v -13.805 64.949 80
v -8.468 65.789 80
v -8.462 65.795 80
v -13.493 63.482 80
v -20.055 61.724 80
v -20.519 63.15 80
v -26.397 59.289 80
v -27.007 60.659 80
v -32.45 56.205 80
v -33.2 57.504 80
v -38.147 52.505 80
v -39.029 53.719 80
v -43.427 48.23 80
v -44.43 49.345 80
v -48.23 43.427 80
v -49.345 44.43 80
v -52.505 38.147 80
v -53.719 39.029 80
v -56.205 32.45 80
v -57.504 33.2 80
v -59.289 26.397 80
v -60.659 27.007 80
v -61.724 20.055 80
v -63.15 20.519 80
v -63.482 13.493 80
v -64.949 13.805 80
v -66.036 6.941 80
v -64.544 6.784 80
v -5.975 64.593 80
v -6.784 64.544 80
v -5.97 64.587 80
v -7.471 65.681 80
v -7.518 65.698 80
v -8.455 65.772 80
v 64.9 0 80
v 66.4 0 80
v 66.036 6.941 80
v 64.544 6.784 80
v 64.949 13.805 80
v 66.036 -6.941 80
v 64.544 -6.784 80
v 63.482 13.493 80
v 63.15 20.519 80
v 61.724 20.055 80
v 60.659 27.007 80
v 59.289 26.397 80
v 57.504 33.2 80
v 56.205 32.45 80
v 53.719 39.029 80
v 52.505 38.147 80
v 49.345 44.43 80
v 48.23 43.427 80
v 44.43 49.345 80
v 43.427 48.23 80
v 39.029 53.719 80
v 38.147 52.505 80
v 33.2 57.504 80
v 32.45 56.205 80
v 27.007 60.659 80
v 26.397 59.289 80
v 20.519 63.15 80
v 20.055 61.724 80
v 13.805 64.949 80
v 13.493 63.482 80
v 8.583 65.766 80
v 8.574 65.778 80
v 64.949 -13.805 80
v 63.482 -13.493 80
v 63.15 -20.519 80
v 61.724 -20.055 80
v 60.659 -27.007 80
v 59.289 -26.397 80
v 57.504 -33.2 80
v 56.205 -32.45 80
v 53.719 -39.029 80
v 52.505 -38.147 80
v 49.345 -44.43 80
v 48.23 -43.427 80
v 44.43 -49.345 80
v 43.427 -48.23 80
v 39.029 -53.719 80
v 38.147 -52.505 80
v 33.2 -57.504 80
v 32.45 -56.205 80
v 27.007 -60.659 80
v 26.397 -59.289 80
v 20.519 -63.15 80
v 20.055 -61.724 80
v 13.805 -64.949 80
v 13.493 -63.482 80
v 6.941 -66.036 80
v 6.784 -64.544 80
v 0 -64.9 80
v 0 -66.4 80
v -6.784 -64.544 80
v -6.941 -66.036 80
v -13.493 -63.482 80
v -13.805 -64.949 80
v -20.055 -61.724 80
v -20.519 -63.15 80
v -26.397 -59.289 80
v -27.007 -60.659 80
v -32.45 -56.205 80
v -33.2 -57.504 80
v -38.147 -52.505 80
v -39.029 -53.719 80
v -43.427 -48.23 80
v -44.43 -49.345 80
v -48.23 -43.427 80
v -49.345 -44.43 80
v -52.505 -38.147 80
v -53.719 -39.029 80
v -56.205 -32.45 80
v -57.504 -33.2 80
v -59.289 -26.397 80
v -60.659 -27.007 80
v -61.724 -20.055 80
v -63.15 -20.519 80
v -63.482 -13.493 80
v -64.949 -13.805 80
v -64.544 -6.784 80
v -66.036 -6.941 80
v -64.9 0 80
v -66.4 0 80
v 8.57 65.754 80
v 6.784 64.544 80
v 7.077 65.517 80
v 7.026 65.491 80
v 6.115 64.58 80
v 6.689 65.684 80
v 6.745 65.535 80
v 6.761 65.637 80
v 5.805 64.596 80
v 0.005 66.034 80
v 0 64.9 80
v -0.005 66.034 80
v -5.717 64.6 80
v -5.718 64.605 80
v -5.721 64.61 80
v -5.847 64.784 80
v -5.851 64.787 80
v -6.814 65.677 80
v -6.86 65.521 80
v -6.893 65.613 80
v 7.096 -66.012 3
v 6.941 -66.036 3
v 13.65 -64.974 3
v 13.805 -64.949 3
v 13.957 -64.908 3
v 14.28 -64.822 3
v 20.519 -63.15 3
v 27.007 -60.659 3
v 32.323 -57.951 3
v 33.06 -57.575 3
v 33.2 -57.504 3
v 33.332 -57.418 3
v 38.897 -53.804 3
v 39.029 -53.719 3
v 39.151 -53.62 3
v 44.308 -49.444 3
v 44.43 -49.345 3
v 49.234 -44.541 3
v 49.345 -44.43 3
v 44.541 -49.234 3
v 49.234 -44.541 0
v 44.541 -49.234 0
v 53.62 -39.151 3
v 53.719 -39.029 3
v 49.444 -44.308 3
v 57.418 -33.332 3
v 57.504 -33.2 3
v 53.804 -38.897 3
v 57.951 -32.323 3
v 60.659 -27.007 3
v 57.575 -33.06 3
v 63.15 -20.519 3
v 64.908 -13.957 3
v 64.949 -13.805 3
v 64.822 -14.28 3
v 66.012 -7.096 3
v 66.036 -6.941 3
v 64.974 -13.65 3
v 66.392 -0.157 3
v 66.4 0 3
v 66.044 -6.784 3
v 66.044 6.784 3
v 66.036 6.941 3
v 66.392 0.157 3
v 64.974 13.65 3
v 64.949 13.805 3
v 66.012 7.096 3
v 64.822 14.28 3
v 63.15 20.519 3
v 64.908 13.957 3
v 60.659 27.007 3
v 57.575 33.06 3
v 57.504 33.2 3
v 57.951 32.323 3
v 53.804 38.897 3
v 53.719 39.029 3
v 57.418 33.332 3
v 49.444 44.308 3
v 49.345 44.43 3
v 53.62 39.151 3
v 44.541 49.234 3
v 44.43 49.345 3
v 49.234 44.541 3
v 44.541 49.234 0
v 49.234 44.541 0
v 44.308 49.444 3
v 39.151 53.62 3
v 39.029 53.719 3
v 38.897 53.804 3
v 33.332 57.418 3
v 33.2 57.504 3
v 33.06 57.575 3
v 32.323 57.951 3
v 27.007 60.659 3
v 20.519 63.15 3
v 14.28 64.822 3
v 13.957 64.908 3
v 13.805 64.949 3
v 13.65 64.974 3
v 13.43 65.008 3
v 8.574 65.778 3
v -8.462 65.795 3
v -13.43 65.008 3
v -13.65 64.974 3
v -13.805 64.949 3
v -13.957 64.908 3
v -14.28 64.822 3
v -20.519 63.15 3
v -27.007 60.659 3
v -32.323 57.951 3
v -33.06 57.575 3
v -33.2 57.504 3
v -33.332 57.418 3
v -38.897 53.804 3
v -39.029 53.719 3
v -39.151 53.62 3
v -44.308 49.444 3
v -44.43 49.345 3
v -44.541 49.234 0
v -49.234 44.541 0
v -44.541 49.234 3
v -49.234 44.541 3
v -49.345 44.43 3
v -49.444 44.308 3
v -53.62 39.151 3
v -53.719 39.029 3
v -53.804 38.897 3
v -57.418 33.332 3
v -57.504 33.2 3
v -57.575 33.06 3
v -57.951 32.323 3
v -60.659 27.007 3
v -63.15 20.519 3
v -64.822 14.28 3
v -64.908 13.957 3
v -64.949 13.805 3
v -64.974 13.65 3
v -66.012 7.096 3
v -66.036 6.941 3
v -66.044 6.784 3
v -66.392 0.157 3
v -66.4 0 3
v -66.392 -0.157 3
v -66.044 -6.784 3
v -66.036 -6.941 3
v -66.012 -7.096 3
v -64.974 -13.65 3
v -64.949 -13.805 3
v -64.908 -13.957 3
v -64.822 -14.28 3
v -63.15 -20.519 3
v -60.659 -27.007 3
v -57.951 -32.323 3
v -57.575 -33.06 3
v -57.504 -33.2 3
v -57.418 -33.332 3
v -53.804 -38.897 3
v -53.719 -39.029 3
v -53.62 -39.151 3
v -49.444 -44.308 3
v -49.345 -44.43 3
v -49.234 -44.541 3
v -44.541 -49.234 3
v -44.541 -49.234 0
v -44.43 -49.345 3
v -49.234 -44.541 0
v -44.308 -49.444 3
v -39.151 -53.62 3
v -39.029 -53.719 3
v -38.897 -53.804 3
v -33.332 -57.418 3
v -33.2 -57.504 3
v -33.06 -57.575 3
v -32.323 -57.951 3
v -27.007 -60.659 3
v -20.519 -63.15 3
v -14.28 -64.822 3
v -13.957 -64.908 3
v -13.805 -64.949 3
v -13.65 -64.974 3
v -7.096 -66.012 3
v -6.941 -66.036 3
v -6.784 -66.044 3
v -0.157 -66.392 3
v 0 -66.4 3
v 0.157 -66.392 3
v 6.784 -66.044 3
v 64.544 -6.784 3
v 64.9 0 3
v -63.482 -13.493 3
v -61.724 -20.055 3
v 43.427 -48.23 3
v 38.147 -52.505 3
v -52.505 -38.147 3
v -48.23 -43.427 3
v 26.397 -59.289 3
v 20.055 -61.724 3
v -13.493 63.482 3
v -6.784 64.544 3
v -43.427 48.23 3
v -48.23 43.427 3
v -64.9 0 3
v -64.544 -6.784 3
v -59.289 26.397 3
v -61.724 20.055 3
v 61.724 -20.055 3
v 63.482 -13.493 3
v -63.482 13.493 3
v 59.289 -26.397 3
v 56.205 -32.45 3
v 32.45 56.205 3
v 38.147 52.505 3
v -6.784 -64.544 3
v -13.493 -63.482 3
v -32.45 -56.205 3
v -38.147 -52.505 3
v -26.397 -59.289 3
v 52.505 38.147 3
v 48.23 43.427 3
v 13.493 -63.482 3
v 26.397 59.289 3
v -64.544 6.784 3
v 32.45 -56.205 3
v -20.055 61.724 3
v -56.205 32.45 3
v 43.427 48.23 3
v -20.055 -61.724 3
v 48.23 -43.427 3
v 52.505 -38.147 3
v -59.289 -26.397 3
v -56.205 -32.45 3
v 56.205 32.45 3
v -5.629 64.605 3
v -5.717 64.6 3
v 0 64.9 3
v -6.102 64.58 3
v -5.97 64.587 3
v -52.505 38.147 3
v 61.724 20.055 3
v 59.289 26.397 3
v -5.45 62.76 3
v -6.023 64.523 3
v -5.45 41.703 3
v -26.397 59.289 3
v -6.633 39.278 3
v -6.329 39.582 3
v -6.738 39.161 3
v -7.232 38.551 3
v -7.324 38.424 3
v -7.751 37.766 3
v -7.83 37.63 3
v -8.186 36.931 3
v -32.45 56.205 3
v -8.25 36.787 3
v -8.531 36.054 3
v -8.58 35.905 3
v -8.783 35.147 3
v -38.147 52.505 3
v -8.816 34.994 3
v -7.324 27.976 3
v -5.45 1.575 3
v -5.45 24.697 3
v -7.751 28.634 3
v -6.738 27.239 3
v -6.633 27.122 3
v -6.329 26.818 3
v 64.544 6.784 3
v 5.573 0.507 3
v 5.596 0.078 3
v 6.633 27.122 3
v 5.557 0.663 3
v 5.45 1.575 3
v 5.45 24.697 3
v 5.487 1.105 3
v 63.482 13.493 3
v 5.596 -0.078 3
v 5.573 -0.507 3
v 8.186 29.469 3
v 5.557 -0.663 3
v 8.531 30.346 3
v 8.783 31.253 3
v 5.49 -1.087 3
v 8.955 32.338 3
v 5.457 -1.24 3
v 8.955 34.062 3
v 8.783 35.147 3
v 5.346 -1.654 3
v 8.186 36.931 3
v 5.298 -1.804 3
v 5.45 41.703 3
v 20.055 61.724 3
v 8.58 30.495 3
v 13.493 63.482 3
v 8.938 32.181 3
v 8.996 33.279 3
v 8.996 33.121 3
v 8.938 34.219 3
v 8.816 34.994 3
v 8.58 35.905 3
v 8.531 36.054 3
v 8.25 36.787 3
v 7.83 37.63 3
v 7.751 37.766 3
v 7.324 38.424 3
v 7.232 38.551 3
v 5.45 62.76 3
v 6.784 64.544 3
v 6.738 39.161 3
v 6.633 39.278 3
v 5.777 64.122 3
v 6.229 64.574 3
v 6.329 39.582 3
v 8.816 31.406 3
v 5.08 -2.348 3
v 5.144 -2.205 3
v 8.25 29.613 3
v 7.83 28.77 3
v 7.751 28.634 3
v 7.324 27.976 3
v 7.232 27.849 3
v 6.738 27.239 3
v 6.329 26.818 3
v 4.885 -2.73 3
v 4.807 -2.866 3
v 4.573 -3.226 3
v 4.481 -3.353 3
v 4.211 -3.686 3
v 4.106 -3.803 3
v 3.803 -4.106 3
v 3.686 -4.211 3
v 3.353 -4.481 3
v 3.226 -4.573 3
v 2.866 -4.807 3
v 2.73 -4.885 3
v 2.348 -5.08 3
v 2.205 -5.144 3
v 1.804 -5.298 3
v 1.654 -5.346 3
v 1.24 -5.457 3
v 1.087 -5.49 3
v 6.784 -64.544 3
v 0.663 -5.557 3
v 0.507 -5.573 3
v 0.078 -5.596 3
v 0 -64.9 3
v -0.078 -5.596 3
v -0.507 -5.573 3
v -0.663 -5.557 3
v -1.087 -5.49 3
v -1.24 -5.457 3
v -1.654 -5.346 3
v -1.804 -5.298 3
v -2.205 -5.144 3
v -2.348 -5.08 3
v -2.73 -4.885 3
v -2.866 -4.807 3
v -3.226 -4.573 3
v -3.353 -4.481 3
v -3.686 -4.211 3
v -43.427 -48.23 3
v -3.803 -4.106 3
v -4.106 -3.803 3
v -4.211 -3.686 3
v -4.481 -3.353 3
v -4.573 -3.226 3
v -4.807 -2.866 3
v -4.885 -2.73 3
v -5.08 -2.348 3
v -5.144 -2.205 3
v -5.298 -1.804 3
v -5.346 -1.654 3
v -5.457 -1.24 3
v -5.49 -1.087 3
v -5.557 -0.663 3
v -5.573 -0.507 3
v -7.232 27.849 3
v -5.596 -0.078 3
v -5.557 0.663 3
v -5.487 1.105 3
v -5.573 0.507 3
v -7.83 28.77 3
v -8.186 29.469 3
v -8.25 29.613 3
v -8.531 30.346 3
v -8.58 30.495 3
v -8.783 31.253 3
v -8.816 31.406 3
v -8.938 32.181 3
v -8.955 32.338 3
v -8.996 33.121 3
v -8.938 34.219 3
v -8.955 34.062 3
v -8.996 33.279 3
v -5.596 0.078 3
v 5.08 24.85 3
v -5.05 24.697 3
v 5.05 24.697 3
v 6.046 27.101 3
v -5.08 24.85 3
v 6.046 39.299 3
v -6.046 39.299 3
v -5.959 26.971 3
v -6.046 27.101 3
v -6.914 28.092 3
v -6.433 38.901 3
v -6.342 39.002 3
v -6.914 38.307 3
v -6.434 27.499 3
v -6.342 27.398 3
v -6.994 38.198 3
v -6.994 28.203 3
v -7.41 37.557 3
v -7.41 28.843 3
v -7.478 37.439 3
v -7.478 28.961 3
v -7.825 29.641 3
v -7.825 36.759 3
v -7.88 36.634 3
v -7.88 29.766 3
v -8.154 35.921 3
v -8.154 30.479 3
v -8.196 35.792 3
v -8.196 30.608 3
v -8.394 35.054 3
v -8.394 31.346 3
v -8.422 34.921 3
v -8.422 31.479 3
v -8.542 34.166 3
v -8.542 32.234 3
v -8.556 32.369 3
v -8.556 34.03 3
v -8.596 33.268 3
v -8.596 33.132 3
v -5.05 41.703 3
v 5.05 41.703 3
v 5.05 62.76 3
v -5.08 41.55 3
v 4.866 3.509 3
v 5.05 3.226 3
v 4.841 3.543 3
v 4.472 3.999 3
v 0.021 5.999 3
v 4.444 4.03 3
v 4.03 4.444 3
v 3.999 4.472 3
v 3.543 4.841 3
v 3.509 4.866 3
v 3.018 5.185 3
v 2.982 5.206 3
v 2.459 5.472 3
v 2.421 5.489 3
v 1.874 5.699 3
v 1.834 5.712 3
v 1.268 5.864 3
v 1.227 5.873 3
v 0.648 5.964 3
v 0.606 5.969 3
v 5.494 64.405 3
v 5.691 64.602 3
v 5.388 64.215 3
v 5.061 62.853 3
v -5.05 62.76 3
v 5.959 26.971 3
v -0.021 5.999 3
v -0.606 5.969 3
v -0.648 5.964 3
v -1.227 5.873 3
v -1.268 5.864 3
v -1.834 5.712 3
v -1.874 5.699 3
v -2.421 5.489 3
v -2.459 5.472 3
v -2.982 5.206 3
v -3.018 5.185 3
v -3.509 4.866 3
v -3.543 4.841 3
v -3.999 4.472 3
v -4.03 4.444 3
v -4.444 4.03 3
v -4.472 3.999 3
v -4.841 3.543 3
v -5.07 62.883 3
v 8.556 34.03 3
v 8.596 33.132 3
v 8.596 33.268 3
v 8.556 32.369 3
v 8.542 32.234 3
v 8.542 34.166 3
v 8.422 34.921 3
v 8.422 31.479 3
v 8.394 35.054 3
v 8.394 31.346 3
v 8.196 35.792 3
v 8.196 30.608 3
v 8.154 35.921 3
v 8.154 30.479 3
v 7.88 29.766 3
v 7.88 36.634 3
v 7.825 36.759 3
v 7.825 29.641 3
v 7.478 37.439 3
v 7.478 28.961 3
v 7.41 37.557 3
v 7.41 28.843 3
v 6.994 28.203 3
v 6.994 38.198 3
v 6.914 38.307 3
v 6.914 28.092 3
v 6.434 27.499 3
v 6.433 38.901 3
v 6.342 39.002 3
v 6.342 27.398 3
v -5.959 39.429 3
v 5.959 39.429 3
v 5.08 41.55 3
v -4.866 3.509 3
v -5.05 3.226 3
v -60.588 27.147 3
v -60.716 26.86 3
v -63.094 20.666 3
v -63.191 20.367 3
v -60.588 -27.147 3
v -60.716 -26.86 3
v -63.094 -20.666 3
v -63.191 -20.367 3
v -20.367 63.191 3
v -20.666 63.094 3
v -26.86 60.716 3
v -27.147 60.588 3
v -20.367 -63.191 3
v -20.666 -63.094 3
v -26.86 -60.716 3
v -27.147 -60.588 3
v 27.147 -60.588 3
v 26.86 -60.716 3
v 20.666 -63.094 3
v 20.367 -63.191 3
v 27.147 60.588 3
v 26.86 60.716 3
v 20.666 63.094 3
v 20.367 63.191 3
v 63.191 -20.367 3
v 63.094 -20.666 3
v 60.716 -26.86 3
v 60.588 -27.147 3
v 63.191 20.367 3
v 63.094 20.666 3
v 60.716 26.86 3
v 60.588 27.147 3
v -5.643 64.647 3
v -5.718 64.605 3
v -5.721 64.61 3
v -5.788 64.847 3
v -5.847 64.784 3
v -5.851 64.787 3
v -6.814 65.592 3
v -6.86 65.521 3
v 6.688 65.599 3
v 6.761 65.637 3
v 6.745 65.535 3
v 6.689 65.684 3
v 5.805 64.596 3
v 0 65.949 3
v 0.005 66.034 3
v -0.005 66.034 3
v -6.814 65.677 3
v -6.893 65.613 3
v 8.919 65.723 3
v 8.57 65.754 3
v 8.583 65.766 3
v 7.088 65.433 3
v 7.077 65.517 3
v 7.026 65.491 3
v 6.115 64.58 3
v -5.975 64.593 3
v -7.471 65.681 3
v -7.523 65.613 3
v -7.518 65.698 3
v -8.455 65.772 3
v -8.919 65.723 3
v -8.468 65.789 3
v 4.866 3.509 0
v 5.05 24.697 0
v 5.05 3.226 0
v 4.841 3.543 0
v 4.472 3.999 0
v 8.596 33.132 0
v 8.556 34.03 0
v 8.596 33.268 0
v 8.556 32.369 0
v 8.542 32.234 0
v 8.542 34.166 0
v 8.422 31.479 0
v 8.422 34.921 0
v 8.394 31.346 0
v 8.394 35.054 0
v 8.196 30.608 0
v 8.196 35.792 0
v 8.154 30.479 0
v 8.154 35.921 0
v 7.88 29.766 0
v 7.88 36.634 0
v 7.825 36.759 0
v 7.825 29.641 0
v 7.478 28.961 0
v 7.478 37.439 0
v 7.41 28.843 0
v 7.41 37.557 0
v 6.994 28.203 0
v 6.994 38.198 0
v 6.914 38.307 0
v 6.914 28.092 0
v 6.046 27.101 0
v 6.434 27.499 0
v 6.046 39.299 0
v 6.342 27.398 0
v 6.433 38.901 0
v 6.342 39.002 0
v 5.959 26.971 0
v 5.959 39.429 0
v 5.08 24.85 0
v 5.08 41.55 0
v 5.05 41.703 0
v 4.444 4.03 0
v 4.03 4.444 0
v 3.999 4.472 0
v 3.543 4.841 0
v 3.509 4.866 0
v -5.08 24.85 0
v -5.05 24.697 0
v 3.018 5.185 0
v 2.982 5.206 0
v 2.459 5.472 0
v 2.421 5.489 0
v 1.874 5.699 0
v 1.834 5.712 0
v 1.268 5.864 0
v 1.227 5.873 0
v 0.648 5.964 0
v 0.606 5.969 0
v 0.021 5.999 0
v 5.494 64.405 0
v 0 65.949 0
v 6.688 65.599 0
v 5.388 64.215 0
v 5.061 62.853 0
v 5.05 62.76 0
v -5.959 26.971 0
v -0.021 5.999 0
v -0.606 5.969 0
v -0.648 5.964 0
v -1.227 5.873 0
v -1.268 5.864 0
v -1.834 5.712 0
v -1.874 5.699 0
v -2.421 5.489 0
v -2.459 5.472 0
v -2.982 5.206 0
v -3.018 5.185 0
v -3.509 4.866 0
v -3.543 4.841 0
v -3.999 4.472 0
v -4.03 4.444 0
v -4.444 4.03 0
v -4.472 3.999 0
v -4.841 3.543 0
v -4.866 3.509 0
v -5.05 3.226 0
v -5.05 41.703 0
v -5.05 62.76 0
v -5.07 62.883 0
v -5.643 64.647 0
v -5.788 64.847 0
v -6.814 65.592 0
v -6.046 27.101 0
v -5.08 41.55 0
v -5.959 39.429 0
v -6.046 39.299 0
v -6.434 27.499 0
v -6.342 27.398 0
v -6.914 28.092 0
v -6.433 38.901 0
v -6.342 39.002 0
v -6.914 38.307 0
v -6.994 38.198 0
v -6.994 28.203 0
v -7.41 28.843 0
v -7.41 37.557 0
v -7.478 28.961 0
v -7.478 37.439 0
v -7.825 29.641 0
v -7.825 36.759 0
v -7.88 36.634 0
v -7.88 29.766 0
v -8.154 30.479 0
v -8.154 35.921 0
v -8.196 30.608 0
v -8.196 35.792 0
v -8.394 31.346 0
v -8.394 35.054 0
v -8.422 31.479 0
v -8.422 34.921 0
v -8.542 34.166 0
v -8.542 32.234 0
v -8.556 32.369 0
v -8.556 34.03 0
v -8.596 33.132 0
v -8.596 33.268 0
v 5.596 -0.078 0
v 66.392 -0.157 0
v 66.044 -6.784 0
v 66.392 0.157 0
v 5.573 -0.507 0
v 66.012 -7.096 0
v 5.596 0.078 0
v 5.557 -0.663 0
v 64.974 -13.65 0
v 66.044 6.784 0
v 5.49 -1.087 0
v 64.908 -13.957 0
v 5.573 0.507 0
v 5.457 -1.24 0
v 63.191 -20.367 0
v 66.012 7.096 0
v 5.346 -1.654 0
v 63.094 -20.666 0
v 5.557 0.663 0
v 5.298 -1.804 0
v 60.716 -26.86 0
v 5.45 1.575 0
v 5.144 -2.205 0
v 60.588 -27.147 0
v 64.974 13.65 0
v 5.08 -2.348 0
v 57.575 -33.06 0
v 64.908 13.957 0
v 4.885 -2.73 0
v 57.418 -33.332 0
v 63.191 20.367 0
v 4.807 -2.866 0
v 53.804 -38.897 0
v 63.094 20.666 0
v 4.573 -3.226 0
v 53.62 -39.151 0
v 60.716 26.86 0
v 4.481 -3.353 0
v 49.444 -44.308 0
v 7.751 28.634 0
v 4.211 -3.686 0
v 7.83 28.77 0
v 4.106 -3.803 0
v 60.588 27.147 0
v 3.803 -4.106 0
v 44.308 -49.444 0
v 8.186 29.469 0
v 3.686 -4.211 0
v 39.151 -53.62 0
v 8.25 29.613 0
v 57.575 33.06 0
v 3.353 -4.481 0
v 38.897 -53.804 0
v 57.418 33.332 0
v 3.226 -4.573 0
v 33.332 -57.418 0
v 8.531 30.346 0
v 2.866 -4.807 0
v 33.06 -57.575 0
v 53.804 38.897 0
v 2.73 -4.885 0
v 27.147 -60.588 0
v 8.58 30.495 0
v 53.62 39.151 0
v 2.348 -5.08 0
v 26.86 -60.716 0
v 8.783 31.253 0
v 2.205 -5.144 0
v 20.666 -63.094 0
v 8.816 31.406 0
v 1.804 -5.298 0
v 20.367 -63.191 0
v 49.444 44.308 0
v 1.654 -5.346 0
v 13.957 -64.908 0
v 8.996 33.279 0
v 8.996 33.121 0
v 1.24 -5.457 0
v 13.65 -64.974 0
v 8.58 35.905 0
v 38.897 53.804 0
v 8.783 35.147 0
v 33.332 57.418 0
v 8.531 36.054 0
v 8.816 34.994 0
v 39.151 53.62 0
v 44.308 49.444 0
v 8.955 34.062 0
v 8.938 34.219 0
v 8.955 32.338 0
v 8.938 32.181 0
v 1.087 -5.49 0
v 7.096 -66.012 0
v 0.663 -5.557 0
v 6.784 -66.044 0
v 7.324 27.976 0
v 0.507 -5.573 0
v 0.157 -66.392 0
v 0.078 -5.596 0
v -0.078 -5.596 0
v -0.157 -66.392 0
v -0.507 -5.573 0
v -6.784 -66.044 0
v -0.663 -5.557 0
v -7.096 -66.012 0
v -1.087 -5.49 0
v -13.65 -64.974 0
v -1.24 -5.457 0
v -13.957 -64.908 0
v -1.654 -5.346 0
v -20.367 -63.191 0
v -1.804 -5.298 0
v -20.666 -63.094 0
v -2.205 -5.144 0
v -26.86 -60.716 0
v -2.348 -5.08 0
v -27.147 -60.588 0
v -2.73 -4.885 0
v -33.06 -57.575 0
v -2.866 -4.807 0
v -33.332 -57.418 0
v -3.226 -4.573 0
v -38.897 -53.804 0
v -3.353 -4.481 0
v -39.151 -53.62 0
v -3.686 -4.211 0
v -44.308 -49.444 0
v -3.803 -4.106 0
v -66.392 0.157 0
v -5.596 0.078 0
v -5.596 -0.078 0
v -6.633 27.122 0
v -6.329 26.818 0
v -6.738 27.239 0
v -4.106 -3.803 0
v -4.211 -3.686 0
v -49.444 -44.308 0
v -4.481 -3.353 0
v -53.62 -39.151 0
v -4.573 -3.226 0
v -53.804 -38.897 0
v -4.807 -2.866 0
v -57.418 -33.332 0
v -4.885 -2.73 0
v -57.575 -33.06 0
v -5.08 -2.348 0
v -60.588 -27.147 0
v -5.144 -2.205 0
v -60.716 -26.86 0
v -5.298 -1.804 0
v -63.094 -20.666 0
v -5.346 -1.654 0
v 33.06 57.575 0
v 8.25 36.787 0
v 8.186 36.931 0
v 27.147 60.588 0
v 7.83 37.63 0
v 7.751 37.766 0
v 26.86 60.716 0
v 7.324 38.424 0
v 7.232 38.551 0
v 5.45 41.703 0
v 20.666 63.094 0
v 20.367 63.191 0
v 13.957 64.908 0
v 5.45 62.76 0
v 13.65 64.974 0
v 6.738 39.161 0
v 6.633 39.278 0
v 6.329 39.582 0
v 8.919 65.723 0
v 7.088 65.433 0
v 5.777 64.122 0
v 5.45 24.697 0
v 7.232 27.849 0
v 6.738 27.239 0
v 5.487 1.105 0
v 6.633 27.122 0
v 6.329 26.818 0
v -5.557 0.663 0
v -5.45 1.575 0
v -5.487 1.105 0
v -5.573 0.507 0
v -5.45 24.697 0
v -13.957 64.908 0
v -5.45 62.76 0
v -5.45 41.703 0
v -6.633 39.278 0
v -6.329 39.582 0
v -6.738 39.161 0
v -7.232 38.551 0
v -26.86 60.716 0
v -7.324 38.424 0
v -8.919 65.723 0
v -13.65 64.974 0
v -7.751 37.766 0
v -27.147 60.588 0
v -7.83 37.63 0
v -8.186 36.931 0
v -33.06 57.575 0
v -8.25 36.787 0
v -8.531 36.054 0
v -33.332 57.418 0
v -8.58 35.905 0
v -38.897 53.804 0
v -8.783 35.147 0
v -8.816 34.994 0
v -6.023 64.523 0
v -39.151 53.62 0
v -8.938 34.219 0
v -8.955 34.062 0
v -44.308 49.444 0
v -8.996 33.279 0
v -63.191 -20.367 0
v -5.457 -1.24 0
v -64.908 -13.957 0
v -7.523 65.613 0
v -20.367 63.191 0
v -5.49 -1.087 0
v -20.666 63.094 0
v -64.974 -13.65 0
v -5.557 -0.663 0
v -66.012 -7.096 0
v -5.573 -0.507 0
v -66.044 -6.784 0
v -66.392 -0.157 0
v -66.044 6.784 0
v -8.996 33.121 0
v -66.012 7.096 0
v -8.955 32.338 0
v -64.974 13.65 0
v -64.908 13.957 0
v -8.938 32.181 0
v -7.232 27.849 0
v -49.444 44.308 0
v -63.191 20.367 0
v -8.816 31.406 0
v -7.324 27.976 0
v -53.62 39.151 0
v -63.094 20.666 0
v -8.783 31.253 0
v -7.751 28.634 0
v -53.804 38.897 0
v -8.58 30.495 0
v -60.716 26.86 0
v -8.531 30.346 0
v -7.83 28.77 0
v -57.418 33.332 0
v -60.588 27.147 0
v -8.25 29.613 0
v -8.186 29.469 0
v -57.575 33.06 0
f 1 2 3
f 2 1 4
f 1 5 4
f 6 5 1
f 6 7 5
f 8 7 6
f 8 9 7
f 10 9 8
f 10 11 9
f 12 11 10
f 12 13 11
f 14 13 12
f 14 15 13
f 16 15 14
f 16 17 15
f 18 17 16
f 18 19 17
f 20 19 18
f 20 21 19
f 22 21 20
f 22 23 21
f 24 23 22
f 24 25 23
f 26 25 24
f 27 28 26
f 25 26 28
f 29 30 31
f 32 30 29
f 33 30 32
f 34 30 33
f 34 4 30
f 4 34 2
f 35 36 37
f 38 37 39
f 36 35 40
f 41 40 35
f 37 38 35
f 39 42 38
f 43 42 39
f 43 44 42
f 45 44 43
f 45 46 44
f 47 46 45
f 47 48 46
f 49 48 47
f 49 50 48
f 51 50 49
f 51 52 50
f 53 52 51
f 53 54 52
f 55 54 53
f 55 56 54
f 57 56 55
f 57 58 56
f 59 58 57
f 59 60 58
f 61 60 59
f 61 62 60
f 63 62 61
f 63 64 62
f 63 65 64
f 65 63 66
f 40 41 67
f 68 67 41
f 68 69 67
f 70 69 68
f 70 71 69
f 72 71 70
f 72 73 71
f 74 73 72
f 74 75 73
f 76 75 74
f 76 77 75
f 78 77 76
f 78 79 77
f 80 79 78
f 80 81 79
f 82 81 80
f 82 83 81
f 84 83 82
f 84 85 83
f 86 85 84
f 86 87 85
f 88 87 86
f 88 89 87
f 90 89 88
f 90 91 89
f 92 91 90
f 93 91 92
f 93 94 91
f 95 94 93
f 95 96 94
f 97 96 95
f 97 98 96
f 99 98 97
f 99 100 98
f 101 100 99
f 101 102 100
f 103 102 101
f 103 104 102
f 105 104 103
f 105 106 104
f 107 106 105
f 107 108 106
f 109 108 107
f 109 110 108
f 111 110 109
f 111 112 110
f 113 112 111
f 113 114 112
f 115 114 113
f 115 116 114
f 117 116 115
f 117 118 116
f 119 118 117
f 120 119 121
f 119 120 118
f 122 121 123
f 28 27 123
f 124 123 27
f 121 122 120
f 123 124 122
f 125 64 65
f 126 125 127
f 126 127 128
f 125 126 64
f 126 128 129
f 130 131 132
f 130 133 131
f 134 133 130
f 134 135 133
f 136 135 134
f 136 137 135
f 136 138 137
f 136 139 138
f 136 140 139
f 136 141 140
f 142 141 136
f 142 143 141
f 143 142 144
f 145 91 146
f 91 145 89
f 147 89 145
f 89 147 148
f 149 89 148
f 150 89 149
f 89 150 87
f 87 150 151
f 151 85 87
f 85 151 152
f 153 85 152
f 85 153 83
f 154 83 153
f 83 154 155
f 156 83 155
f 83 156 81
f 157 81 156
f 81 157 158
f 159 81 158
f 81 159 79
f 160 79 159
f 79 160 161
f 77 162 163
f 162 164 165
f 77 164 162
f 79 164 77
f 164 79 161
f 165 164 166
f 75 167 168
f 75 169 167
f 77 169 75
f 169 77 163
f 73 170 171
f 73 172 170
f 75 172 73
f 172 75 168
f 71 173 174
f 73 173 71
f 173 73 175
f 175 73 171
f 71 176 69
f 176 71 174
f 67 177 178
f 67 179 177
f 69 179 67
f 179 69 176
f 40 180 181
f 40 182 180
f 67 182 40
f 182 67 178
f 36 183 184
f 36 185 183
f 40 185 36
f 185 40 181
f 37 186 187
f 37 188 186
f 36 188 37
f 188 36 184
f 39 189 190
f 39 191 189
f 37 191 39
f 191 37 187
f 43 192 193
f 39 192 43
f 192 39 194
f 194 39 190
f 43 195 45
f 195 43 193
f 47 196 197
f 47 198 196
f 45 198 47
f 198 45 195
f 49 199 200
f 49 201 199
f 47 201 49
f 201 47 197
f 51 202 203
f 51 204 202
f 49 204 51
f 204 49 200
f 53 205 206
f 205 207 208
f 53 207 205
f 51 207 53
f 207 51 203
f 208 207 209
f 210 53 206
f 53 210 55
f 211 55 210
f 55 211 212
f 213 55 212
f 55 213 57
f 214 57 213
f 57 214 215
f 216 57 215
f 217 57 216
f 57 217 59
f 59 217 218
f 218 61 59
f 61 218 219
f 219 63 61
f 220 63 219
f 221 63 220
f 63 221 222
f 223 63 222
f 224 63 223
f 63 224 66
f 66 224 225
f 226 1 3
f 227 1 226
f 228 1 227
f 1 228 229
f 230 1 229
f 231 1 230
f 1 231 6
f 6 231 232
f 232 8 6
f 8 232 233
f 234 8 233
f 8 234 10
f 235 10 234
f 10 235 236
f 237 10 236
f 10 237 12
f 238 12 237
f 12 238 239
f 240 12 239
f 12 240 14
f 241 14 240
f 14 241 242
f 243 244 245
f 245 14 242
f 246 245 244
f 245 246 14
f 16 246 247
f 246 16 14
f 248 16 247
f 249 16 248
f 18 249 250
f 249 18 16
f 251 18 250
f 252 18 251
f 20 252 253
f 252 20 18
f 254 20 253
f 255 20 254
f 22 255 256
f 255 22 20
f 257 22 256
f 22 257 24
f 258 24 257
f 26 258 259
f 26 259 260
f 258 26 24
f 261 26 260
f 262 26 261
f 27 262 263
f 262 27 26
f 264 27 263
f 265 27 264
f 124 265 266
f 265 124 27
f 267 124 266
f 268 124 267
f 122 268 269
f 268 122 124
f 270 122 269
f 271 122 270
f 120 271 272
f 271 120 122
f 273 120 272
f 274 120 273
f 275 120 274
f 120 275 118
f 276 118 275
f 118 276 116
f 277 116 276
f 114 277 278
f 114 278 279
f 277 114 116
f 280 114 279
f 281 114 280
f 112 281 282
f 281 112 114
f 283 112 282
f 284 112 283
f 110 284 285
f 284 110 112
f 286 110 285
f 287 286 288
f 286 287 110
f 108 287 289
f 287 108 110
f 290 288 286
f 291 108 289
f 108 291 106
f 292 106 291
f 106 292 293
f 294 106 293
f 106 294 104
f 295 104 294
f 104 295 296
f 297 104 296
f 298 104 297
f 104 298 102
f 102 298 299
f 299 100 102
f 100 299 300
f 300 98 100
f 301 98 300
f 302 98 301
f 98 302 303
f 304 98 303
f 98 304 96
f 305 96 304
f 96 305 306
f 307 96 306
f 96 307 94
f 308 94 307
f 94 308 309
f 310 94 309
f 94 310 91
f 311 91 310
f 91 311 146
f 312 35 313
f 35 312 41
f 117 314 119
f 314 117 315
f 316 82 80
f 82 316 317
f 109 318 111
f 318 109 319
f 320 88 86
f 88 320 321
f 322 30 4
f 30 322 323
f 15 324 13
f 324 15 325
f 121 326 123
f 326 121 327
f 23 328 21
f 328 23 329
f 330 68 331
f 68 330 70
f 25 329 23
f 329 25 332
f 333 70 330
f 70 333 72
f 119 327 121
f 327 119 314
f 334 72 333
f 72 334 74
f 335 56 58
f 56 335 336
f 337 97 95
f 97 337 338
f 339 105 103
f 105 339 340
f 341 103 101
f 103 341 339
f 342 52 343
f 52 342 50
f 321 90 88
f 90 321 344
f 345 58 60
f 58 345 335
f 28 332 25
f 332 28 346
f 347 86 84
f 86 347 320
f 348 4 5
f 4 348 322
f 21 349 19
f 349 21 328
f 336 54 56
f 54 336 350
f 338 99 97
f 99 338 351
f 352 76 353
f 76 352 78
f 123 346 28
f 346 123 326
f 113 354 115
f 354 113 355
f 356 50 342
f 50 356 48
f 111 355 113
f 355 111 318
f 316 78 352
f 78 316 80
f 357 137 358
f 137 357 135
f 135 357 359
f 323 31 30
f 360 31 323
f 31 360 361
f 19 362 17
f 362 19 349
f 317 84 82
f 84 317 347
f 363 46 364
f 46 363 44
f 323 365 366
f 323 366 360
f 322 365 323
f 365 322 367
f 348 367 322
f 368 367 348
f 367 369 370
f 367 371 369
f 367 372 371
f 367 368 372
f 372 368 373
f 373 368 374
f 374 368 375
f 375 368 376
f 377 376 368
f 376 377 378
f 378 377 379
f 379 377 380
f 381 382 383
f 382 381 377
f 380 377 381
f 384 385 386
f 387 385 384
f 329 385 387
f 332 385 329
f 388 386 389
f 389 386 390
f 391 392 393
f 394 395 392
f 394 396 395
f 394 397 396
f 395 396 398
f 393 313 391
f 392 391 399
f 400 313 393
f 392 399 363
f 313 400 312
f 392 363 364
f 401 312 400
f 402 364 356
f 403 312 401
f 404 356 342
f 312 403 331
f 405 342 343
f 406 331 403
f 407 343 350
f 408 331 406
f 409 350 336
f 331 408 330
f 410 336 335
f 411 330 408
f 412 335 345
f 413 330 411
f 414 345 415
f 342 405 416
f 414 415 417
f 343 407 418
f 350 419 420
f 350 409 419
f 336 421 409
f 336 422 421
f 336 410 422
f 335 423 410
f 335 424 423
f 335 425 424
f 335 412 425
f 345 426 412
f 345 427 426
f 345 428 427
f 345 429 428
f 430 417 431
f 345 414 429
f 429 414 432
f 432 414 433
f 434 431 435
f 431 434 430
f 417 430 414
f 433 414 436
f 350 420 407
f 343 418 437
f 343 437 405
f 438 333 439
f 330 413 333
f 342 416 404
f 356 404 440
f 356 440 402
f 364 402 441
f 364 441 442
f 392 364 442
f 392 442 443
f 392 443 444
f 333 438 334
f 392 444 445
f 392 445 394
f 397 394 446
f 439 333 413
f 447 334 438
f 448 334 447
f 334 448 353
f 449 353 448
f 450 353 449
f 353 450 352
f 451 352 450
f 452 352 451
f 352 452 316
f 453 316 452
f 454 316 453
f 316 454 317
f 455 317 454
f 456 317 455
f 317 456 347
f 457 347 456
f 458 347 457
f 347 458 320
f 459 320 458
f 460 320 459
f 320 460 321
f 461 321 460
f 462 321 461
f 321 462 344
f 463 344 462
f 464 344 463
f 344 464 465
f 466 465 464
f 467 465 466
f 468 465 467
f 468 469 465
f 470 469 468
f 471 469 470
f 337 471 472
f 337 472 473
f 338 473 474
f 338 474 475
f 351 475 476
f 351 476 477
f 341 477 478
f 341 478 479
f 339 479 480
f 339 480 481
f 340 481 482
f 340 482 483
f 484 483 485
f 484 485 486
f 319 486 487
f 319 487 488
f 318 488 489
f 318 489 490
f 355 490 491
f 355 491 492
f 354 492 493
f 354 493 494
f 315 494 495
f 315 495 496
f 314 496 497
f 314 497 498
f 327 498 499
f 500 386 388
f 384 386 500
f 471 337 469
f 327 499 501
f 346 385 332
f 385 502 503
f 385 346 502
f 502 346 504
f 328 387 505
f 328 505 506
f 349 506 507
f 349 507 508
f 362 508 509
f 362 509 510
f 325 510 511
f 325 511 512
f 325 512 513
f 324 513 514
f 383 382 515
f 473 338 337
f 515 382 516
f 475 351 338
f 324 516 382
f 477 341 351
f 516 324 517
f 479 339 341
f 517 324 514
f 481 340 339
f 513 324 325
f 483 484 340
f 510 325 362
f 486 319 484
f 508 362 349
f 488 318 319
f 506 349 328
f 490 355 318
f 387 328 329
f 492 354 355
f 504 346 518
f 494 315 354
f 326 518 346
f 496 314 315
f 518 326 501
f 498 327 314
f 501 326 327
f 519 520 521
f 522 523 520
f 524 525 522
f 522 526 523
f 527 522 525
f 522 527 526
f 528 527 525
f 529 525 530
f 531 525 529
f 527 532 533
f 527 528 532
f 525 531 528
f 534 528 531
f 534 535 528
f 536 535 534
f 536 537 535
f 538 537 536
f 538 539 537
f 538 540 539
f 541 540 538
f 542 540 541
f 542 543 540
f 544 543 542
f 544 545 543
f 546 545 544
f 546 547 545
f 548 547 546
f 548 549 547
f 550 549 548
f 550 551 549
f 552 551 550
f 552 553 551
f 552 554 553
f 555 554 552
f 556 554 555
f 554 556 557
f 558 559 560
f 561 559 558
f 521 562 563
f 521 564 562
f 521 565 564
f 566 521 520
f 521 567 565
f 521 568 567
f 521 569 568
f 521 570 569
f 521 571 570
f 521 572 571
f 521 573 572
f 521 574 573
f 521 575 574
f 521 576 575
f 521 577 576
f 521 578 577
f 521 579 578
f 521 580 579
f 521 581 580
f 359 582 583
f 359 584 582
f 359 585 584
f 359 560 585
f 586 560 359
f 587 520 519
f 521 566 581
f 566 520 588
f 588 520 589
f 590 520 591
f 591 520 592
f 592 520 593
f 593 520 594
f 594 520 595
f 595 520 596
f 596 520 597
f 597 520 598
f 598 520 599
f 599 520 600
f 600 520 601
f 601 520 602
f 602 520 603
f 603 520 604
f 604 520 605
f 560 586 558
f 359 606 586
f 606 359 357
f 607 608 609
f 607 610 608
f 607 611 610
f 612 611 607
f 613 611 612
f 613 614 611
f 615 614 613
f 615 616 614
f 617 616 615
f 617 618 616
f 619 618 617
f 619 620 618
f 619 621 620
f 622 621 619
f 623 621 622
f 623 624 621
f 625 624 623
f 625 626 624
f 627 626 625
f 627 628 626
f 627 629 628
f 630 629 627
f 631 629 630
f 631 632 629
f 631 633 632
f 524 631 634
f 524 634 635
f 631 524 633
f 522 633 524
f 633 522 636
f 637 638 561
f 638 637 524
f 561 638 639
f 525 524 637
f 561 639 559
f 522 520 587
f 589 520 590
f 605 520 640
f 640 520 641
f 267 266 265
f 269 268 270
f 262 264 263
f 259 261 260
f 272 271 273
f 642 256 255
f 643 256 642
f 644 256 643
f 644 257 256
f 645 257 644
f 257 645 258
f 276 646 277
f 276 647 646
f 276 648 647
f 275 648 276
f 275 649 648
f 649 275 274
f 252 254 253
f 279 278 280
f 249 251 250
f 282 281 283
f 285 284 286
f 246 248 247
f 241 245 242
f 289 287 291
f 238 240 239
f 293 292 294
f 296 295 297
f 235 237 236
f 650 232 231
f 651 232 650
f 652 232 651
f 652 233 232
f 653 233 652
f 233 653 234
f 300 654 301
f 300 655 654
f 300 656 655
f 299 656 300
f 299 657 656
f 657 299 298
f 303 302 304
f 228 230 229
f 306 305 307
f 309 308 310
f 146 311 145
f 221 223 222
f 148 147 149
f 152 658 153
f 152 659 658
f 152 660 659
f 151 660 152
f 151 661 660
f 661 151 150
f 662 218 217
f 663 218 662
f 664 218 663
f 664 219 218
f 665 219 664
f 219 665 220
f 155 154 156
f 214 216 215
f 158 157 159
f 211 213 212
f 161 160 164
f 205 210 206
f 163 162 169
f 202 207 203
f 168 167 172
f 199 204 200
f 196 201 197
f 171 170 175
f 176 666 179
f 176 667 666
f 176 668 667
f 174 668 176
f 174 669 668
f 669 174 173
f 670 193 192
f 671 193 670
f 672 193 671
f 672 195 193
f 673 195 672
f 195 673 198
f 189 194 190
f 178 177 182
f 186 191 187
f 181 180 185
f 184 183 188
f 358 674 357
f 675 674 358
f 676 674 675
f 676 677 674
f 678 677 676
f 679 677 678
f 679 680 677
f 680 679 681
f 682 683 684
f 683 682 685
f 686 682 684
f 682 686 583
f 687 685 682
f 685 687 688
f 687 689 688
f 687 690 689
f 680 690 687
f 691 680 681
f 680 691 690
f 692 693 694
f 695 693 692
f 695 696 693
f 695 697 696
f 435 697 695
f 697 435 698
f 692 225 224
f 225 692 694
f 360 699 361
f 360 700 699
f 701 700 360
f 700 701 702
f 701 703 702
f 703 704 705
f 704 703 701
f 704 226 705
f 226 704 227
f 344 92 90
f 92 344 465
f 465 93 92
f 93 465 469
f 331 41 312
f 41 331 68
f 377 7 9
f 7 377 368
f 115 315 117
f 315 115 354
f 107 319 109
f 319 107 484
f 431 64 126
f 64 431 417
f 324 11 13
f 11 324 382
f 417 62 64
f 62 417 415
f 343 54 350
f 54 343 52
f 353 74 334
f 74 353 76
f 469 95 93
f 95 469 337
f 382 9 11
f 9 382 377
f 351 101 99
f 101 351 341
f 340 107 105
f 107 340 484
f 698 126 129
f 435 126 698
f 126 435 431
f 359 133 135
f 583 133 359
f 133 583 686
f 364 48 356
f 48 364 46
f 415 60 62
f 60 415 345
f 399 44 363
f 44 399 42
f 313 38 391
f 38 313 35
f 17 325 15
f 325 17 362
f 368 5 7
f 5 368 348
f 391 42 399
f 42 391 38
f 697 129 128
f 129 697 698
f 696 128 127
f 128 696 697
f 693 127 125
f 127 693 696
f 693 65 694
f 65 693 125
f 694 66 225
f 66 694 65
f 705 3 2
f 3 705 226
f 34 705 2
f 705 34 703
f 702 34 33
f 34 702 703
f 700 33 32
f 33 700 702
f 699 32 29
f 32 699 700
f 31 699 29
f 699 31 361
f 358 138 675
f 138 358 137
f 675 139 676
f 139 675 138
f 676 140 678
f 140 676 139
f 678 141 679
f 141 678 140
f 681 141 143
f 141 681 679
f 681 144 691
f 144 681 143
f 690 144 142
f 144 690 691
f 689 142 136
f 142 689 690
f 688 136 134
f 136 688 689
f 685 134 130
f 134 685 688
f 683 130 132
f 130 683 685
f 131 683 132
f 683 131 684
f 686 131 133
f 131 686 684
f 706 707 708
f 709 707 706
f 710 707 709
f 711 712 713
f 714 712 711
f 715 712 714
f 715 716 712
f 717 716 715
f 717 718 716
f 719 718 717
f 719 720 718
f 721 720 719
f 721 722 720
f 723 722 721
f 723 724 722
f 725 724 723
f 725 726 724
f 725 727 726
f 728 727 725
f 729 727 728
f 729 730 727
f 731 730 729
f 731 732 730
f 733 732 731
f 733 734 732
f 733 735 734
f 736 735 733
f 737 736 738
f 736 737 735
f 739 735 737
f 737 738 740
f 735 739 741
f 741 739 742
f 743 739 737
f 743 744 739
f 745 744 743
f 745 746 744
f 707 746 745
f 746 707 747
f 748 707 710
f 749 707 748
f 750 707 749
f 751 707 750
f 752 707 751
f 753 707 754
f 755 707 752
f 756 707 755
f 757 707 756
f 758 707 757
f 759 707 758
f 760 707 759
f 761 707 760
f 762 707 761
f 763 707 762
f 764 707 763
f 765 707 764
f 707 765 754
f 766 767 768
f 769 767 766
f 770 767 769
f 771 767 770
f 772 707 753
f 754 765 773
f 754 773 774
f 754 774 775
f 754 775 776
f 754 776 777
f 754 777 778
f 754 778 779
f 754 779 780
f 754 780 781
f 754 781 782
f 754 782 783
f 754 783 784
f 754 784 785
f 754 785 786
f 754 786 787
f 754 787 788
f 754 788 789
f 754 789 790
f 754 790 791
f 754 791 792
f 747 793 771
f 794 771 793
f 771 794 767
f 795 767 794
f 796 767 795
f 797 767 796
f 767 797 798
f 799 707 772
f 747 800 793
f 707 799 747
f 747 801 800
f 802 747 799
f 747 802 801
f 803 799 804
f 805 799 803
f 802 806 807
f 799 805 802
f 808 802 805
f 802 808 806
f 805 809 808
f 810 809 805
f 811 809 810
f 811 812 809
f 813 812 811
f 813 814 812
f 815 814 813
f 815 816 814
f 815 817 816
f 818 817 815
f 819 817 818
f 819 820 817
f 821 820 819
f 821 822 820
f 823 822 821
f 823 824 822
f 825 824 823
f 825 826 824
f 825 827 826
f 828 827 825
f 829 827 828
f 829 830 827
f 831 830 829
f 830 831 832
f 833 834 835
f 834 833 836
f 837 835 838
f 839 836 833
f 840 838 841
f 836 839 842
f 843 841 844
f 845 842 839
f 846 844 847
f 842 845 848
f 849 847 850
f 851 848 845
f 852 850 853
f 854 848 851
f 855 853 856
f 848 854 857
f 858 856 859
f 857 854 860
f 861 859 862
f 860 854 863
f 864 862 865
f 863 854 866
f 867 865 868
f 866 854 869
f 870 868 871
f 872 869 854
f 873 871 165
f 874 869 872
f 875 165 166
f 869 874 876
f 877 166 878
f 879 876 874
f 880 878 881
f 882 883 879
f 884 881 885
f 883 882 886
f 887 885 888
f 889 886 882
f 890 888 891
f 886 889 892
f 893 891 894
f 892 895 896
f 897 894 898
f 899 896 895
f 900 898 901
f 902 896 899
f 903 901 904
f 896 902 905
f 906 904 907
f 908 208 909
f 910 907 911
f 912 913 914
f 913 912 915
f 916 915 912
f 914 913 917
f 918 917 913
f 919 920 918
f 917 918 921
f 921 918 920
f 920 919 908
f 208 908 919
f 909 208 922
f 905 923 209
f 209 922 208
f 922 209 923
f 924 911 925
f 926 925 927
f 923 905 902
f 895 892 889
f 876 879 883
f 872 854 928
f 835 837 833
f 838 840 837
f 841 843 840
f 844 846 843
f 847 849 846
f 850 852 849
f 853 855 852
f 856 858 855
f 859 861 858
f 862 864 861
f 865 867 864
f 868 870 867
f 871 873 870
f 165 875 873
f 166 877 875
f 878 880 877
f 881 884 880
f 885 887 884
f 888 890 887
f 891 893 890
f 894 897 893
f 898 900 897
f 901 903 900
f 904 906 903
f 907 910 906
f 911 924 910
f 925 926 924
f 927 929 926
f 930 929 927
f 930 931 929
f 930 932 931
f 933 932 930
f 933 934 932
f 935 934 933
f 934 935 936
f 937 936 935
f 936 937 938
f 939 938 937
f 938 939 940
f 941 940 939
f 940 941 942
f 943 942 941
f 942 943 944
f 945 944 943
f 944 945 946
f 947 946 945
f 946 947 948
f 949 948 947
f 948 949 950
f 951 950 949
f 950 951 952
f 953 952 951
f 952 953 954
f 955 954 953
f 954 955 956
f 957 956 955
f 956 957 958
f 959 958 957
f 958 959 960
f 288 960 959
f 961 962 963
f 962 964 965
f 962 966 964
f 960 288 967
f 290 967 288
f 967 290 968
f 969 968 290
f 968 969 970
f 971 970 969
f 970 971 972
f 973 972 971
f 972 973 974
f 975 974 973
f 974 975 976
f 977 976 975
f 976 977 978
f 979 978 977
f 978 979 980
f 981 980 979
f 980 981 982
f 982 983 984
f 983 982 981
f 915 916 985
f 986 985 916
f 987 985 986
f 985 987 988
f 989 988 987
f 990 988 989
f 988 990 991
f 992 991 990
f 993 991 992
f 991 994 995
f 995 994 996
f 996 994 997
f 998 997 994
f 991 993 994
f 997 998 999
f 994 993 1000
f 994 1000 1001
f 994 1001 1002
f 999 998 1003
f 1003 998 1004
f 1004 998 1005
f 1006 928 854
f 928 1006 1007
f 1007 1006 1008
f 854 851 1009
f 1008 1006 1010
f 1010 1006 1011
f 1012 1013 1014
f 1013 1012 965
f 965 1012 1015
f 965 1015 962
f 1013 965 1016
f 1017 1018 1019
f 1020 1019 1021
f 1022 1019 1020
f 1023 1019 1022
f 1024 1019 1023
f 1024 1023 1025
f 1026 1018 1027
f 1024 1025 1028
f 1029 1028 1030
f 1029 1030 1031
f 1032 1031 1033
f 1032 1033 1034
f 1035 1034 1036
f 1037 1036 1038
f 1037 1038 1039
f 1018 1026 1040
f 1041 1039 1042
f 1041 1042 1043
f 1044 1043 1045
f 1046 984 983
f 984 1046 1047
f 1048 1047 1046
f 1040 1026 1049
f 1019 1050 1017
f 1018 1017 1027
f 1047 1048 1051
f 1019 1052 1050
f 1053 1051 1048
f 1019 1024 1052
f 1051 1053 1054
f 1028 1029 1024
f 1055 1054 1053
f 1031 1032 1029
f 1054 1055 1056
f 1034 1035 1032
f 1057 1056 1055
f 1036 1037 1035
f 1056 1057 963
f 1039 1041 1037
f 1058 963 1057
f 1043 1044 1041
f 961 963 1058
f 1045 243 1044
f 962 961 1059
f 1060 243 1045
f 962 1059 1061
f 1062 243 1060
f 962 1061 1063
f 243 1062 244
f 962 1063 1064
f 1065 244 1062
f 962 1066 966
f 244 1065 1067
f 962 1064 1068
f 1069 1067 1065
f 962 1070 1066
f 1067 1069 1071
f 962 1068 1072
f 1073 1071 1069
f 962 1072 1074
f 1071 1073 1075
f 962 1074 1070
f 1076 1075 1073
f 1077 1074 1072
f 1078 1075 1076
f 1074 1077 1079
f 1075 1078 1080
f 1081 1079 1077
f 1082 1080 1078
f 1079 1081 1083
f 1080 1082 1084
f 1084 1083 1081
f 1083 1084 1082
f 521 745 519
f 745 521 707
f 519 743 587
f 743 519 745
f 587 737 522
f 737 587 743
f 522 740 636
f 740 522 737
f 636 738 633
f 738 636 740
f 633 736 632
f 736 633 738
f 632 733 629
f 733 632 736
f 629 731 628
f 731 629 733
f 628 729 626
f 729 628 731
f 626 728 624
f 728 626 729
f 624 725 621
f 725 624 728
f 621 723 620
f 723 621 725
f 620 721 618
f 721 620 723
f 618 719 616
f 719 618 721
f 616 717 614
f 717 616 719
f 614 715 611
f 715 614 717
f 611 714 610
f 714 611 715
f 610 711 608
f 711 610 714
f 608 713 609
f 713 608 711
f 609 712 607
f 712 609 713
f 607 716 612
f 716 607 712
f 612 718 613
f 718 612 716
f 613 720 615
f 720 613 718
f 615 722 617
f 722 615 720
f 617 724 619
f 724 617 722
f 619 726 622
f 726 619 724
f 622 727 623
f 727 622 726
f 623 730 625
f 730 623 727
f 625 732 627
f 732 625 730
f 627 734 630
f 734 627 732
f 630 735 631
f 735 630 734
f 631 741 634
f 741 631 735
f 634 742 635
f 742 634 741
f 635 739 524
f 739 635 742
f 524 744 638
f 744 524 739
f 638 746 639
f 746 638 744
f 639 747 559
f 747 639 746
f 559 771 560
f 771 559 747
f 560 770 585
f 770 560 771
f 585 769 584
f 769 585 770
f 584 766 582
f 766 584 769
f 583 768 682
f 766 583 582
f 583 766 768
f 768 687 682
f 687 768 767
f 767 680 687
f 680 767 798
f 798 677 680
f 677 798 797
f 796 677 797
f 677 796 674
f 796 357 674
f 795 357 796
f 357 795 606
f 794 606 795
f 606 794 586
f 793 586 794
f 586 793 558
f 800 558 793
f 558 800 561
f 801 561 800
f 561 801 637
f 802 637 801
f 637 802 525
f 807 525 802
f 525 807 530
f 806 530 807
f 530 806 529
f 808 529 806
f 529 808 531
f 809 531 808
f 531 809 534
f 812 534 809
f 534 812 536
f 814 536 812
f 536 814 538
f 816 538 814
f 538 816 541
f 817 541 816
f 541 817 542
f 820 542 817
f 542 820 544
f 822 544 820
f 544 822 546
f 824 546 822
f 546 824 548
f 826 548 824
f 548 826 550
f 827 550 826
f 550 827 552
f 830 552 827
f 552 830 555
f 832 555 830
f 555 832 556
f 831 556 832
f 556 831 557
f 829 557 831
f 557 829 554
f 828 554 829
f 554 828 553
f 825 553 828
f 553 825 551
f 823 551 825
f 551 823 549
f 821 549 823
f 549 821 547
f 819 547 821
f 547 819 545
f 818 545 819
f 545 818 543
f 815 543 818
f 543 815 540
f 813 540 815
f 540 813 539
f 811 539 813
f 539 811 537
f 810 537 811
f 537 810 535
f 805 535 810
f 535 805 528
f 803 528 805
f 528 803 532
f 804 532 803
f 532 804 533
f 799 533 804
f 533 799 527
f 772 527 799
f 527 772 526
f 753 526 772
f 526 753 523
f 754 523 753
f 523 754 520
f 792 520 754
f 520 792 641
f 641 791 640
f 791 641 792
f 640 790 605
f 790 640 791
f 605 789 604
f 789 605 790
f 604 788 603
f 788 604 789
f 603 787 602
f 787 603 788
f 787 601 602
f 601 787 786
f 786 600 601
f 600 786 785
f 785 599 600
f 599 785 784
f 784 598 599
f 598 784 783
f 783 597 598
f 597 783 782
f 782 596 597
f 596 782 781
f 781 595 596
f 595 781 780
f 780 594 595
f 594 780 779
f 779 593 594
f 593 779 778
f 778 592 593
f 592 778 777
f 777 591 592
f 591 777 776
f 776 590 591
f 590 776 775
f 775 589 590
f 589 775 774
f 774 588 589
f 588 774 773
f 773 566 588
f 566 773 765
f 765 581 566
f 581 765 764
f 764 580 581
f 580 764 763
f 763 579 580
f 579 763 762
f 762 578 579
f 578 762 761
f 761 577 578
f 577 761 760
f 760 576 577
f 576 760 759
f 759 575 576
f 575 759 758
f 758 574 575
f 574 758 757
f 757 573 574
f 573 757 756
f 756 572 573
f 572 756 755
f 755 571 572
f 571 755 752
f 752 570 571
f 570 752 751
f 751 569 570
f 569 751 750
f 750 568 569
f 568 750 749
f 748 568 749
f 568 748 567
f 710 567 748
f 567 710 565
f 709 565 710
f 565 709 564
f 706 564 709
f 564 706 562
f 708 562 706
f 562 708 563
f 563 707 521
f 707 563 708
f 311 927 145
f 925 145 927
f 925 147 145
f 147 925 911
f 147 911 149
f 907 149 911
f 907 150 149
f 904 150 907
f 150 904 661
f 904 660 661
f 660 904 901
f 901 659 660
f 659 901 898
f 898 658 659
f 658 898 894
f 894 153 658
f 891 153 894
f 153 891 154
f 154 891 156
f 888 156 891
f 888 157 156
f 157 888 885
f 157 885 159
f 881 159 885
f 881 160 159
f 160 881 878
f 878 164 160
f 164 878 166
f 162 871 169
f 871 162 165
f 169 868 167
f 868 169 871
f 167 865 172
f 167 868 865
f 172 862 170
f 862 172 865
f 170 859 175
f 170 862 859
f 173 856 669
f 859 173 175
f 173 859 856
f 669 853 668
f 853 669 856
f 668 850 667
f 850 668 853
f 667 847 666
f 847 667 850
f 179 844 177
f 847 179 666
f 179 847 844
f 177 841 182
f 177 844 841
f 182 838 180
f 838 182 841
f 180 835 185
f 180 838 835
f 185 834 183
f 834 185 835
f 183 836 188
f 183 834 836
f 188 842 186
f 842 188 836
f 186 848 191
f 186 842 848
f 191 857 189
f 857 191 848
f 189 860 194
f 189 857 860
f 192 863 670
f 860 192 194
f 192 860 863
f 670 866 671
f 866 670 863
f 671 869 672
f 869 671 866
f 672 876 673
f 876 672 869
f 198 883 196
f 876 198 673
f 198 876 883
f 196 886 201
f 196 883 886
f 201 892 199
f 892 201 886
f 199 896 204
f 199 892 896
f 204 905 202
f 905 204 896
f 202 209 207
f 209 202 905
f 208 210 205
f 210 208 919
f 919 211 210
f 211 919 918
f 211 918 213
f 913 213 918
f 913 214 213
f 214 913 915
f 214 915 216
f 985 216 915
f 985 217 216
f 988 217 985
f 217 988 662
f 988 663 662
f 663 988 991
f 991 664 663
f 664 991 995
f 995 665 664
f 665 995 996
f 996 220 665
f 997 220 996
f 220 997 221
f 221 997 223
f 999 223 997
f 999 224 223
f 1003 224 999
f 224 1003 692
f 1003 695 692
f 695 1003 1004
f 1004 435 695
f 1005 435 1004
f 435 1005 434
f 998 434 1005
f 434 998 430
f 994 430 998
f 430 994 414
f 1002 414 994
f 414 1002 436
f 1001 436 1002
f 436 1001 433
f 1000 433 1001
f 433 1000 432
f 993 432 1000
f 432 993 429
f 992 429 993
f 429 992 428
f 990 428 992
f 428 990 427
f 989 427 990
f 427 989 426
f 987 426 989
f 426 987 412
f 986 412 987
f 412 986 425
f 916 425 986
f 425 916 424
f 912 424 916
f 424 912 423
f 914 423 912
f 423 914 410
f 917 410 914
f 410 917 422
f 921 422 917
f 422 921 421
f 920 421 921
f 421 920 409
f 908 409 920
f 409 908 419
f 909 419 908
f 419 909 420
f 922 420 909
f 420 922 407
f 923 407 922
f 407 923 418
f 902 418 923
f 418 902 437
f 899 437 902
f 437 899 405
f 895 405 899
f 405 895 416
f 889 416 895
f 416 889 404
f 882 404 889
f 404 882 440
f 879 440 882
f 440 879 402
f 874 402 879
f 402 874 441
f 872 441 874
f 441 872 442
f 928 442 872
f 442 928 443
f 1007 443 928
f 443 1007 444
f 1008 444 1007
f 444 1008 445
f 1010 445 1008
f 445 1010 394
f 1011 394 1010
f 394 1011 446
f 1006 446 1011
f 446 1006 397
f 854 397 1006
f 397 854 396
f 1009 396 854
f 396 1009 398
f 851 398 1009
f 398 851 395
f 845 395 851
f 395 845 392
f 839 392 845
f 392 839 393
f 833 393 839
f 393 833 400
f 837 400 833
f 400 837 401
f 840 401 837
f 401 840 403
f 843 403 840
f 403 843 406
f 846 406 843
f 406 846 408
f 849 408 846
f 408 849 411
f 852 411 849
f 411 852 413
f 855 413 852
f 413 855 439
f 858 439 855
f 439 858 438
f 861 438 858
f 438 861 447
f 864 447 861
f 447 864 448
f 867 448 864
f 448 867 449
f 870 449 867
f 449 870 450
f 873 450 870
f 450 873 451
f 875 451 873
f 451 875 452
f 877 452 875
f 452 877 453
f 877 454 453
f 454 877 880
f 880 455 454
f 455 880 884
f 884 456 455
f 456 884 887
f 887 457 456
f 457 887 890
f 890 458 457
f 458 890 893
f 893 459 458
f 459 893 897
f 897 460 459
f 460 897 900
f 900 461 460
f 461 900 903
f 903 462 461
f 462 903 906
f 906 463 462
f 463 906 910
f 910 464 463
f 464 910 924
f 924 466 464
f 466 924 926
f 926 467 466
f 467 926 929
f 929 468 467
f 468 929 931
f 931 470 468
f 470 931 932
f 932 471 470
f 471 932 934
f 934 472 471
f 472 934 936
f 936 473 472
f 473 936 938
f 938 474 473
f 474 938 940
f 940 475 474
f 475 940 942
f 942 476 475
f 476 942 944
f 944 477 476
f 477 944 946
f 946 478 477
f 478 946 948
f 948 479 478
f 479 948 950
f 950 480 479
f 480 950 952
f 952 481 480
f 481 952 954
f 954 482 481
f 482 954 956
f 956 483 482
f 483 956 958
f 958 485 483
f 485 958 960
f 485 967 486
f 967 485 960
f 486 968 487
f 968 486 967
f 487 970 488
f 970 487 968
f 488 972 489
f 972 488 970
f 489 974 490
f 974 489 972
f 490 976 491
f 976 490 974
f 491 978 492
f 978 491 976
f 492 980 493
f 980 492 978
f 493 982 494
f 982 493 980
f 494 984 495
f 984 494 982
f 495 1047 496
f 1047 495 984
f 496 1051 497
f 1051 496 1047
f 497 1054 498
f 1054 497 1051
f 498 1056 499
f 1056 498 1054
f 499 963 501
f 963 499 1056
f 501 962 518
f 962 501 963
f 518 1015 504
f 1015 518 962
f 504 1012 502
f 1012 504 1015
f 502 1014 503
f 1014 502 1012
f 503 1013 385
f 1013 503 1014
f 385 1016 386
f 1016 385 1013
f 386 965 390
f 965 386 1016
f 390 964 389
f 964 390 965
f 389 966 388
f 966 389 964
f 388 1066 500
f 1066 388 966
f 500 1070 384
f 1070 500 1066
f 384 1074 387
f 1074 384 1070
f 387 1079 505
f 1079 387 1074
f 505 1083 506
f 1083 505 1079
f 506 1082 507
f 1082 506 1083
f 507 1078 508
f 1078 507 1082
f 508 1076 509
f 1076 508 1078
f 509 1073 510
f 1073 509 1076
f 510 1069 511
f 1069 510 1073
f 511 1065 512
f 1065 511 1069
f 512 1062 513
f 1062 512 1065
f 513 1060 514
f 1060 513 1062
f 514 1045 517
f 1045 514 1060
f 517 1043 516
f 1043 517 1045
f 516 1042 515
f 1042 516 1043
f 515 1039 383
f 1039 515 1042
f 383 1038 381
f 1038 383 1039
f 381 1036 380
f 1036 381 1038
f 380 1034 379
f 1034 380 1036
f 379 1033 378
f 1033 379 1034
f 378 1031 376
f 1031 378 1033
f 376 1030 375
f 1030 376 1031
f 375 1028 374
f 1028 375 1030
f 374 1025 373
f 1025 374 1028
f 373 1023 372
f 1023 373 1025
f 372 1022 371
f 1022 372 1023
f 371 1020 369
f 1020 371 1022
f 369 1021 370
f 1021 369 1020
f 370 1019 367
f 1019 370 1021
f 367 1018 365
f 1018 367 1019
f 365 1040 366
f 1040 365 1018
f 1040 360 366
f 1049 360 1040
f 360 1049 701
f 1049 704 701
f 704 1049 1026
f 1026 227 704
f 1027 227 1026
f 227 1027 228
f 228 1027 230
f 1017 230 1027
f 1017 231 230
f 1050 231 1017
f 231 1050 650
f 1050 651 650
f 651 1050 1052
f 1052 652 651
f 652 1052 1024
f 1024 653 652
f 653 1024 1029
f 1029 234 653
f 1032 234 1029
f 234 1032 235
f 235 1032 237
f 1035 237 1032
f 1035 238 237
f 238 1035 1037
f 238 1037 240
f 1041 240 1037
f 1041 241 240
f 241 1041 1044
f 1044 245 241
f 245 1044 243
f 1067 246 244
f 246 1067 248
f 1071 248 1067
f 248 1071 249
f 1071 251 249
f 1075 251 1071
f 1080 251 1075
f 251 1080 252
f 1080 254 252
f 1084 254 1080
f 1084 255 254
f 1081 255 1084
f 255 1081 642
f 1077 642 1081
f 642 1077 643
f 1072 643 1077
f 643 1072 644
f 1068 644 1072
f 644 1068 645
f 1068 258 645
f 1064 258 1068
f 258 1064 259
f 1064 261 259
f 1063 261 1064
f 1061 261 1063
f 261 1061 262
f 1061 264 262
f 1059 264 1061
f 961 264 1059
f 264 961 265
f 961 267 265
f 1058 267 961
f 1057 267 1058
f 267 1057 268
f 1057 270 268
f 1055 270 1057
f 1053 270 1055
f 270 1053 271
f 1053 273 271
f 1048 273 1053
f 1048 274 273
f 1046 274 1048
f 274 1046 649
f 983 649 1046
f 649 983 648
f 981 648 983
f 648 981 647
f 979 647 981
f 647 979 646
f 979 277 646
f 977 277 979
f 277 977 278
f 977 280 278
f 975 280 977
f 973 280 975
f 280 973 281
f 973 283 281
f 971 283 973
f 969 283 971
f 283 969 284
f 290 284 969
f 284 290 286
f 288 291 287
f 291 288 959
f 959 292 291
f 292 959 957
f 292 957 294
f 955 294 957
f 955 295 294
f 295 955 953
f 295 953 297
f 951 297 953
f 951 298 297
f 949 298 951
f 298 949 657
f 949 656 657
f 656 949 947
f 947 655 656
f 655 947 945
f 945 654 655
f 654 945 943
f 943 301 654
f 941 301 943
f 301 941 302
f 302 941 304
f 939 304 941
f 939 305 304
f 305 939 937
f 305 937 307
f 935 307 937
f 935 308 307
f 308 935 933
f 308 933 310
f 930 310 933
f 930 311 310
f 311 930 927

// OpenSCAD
outer_wall_dia = 132.8; // The lamp's outer base diameter
rod_dia = 11.2; // The lamp's inner rod diameter
outer_rounding = 3; // How rounded the outer walls are
wall_thick = 3.0; // The thickness of the outer walls
gap_size = 0.4; // The gap between sliding parts
locking_circle_dia = 18.0;
wall_height = 80.0;

module wantCirc(s) {
    circle(d=s,$fn=60);
}

module wantRect(l, w) {
    translate([-l/2,-w/2,0])
        square([l, w]);
}

module lamp_wall_base_2d() {
    difference() {
    wantCirc(outer_wall_dia);
    wantCirc(rod_dia);
    };
}

// The slot to slip the walls onto the lamp
module rod_cutout_2d() {
    union() {
    translate([0, outer_wall_dia/4])
    wantRect(rod_dia-0.3, outer_wall_dia/2);
    translate([0, outer_wall_dia/4])
    wantCirc(locking_circle_dia);
    }
}

module lamp_base_outer_2d() {
    offset(r=outer_rounding) 
    offset(r=-outer_rounding)
    difference() {
    lamp_wall_base_2d();
    rod_cutout_2d();
    }
}

// The part to be cut out of the 3D object
module lamp_base_inner_2d() {
    offset(r=-wall_thick)
    lamp_wall_base_2d();
}

module locking_key() {
    offset(-gap_size)
    difference() {
    wantCirc(outer_wall_dia-0.1);
    lamp_base_outer_2d();
    wantCirc(rod_dia);
    }
}

module lamp_base_2d() {
    union() {
    locking_key();
    lamp_base_outer_2d();
    }
}

module lamp_walls_3d() {
    difference() {
        difference() {
        linear_extrude(wall_height)
            lamp_wall_base_2d();
        translate([0, 0, wall_thick])
        linear_extrude(wall_height - wall_thick)
            wantCirc(outer_wall_dia-wall_thick);
        }
        linear_extrude(wall_thick)
        wantCirc(outer_wall_dia+0.2);
    }
}

module wall_cutout_2d() {
    difference() {
        offset(-0.01)
        lamp_wall_base_2d();
        offset(0.1)
        lamp_base_2d();
    }
}

module wall_cutout_3d() {
    intersection() {
    translate([0, 0, wall_thick])
    linear_extrude(wall_height-wall_thick) {
        offset(0.015)
        wall_cutout_2d();
    }
    lamp_walls_3d();
    }
}

module final_lamp_walls_3d() {
    difference() {
        lamp_walls_3d();
        wall_cutout_3d();
    }
}

union() {
final_lamp_walls_3d();
linear_extrude(wall_thick)
lamp_base_2d();
}
